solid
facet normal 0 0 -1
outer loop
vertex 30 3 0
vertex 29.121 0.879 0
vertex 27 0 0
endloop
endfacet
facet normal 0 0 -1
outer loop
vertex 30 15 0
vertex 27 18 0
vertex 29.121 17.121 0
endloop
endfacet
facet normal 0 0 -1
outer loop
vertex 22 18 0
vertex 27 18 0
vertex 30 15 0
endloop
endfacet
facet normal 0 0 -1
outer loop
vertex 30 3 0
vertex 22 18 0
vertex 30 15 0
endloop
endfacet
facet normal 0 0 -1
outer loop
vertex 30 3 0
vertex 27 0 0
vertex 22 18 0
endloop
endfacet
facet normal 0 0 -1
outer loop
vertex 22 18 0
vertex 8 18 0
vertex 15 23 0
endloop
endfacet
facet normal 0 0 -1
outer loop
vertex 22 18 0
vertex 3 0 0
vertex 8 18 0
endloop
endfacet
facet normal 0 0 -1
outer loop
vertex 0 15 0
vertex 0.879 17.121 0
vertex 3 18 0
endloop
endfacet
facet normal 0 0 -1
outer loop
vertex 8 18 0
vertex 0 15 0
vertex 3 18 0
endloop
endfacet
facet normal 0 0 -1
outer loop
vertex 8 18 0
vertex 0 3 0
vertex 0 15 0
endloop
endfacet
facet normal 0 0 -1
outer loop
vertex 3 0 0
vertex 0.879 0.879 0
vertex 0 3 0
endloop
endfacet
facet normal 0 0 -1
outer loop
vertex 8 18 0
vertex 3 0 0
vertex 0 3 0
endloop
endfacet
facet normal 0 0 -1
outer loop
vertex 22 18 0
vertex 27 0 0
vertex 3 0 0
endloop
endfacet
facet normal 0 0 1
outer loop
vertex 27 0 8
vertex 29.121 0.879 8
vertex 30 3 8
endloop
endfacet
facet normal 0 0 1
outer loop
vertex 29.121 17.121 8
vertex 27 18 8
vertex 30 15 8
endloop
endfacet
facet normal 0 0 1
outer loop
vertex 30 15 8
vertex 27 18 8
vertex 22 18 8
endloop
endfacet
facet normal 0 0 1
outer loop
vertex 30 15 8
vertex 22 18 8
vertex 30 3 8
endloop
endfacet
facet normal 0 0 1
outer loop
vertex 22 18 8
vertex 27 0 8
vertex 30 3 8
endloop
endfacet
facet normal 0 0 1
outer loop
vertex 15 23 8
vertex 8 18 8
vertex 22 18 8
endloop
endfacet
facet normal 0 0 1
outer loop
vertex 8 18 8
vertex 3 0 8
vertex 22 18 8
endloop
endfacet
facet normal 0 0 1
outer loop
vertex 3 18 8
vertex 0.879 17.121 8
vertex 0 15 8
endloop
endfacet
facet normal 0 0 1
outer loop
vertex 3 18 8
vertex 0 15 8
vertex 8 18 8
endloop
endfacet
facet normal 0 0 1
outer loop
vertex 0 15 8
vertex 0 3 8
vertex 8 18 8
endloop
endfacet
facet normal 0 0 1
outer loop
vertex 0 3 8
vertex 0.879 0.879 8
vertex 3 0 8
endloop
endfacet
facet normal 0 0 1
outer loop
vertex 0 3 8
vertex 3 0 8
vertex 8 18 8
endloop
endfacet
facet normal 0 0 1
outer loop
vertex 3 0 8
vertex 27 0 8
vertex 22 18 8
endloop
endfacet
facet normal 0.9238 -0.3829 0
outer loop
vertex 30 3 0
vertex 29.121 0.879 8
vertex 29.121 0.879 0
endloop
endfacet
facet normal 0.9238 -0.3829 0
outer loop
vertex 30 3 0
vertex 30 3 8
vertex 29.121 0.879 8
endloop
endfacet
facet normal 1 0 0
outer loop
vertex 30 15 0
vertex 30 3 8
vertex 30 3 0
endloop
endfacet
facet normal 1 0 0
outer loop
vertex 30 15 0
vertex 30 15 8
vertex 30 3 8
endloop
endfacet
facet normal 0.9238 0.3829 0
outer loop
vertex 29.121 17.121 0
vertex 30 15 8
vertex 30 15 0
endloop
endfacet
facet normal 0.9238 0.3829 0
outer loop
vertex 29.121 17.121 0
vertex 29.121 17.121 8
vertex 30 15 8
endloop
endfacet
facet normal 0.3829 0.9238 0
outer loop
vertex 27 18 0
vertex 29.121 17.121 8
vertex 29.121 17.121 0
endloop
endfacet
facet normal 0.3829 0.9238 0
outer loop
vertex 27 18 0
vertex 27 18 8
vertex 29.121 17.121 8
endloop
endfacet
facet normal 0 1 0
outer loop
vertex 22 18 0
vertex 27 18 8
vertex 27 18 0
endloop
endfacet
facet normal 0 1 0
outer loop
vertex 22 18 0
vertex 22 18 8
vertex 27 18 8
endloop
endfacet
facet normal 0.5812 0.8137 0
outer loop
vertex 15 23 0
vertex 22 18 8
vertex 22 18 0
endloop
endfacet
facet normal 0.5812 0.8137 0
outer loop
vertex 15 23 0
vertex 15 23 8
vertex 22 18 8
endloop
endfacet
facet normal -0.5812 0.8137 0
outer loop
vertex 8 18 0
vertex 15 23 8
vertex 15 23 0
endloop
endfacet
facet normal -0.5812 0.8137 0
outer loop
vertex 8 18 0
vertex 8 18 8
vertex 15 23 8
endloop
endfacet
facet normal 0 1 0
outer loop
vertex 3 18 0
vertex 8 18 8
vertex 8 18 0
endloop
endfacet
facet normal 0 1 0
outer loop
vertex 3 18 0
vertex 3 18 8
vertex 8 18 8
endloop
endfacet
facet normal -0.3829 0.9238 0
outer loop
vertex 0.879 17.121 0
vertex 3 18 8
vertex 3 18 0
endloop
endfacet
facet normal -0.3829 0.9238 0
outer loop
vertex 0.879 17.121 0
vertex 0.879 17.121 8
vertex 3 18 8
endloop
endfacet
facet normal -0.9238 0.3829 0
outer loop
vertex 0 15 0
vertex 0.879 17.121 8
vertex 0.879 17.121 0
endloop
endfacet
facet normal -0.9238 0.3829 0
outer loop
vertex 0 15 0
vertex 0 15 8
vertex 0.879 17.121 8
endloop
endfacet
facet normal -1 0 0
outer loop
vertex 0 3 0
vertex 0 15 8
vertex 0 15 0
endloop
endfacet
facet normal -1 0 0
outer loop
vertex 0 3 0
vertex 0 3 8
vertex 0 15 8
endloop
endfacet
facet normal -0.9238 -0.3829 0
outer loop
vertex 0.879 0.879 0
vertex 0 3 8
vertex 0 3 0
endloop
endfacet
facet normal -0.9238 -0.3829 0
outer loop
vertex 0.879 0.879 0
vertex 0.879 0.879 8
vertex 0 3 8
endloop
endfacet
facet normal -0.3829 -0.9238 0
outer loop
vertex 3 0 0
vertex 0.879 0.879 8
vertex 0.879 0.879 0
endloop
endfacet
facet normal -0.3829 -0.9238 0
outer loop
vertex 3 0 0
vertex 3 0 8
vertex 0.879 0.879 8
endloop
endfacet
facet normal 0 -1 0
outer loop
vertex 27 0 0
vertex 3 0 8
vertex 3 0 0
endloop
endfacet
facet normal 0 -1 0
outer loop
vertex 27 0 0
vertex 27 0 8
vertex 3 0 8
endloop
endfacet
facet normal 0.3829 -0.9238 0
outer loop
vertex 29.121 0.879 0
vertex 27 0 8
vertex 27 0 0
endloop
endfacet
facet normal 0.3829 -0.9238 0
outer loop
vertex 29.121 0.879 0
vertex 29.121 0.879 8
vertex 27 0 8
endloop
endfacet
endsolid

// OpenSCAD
$fn = 32;

// ----------------------------------------------------------------------
// Ratchet pawl: 30 x 18 mm body, beak 5 mm сверху
// ----------------------------------------------------------------------

// --- parameters (mm) ---
profile_height = 8;       // extrusion height
profile_points = 15;      // points of the closed outline

profile = [[0, 3], [0.879, 0.879], [3, 0], [27, 0], [29.121, 0.879], [30, 3], [30, 15], [29.121, 17.121], [27, 18], [22, 18], [15, 23], [8, 18], [3, 18], [0.879, 17.121], [0, 15]];  // single closed polygon, 15 points, counter clockwise

// --- the one profile operation ---
linear_extrude(height = profile_height) polygon(points = profile);
